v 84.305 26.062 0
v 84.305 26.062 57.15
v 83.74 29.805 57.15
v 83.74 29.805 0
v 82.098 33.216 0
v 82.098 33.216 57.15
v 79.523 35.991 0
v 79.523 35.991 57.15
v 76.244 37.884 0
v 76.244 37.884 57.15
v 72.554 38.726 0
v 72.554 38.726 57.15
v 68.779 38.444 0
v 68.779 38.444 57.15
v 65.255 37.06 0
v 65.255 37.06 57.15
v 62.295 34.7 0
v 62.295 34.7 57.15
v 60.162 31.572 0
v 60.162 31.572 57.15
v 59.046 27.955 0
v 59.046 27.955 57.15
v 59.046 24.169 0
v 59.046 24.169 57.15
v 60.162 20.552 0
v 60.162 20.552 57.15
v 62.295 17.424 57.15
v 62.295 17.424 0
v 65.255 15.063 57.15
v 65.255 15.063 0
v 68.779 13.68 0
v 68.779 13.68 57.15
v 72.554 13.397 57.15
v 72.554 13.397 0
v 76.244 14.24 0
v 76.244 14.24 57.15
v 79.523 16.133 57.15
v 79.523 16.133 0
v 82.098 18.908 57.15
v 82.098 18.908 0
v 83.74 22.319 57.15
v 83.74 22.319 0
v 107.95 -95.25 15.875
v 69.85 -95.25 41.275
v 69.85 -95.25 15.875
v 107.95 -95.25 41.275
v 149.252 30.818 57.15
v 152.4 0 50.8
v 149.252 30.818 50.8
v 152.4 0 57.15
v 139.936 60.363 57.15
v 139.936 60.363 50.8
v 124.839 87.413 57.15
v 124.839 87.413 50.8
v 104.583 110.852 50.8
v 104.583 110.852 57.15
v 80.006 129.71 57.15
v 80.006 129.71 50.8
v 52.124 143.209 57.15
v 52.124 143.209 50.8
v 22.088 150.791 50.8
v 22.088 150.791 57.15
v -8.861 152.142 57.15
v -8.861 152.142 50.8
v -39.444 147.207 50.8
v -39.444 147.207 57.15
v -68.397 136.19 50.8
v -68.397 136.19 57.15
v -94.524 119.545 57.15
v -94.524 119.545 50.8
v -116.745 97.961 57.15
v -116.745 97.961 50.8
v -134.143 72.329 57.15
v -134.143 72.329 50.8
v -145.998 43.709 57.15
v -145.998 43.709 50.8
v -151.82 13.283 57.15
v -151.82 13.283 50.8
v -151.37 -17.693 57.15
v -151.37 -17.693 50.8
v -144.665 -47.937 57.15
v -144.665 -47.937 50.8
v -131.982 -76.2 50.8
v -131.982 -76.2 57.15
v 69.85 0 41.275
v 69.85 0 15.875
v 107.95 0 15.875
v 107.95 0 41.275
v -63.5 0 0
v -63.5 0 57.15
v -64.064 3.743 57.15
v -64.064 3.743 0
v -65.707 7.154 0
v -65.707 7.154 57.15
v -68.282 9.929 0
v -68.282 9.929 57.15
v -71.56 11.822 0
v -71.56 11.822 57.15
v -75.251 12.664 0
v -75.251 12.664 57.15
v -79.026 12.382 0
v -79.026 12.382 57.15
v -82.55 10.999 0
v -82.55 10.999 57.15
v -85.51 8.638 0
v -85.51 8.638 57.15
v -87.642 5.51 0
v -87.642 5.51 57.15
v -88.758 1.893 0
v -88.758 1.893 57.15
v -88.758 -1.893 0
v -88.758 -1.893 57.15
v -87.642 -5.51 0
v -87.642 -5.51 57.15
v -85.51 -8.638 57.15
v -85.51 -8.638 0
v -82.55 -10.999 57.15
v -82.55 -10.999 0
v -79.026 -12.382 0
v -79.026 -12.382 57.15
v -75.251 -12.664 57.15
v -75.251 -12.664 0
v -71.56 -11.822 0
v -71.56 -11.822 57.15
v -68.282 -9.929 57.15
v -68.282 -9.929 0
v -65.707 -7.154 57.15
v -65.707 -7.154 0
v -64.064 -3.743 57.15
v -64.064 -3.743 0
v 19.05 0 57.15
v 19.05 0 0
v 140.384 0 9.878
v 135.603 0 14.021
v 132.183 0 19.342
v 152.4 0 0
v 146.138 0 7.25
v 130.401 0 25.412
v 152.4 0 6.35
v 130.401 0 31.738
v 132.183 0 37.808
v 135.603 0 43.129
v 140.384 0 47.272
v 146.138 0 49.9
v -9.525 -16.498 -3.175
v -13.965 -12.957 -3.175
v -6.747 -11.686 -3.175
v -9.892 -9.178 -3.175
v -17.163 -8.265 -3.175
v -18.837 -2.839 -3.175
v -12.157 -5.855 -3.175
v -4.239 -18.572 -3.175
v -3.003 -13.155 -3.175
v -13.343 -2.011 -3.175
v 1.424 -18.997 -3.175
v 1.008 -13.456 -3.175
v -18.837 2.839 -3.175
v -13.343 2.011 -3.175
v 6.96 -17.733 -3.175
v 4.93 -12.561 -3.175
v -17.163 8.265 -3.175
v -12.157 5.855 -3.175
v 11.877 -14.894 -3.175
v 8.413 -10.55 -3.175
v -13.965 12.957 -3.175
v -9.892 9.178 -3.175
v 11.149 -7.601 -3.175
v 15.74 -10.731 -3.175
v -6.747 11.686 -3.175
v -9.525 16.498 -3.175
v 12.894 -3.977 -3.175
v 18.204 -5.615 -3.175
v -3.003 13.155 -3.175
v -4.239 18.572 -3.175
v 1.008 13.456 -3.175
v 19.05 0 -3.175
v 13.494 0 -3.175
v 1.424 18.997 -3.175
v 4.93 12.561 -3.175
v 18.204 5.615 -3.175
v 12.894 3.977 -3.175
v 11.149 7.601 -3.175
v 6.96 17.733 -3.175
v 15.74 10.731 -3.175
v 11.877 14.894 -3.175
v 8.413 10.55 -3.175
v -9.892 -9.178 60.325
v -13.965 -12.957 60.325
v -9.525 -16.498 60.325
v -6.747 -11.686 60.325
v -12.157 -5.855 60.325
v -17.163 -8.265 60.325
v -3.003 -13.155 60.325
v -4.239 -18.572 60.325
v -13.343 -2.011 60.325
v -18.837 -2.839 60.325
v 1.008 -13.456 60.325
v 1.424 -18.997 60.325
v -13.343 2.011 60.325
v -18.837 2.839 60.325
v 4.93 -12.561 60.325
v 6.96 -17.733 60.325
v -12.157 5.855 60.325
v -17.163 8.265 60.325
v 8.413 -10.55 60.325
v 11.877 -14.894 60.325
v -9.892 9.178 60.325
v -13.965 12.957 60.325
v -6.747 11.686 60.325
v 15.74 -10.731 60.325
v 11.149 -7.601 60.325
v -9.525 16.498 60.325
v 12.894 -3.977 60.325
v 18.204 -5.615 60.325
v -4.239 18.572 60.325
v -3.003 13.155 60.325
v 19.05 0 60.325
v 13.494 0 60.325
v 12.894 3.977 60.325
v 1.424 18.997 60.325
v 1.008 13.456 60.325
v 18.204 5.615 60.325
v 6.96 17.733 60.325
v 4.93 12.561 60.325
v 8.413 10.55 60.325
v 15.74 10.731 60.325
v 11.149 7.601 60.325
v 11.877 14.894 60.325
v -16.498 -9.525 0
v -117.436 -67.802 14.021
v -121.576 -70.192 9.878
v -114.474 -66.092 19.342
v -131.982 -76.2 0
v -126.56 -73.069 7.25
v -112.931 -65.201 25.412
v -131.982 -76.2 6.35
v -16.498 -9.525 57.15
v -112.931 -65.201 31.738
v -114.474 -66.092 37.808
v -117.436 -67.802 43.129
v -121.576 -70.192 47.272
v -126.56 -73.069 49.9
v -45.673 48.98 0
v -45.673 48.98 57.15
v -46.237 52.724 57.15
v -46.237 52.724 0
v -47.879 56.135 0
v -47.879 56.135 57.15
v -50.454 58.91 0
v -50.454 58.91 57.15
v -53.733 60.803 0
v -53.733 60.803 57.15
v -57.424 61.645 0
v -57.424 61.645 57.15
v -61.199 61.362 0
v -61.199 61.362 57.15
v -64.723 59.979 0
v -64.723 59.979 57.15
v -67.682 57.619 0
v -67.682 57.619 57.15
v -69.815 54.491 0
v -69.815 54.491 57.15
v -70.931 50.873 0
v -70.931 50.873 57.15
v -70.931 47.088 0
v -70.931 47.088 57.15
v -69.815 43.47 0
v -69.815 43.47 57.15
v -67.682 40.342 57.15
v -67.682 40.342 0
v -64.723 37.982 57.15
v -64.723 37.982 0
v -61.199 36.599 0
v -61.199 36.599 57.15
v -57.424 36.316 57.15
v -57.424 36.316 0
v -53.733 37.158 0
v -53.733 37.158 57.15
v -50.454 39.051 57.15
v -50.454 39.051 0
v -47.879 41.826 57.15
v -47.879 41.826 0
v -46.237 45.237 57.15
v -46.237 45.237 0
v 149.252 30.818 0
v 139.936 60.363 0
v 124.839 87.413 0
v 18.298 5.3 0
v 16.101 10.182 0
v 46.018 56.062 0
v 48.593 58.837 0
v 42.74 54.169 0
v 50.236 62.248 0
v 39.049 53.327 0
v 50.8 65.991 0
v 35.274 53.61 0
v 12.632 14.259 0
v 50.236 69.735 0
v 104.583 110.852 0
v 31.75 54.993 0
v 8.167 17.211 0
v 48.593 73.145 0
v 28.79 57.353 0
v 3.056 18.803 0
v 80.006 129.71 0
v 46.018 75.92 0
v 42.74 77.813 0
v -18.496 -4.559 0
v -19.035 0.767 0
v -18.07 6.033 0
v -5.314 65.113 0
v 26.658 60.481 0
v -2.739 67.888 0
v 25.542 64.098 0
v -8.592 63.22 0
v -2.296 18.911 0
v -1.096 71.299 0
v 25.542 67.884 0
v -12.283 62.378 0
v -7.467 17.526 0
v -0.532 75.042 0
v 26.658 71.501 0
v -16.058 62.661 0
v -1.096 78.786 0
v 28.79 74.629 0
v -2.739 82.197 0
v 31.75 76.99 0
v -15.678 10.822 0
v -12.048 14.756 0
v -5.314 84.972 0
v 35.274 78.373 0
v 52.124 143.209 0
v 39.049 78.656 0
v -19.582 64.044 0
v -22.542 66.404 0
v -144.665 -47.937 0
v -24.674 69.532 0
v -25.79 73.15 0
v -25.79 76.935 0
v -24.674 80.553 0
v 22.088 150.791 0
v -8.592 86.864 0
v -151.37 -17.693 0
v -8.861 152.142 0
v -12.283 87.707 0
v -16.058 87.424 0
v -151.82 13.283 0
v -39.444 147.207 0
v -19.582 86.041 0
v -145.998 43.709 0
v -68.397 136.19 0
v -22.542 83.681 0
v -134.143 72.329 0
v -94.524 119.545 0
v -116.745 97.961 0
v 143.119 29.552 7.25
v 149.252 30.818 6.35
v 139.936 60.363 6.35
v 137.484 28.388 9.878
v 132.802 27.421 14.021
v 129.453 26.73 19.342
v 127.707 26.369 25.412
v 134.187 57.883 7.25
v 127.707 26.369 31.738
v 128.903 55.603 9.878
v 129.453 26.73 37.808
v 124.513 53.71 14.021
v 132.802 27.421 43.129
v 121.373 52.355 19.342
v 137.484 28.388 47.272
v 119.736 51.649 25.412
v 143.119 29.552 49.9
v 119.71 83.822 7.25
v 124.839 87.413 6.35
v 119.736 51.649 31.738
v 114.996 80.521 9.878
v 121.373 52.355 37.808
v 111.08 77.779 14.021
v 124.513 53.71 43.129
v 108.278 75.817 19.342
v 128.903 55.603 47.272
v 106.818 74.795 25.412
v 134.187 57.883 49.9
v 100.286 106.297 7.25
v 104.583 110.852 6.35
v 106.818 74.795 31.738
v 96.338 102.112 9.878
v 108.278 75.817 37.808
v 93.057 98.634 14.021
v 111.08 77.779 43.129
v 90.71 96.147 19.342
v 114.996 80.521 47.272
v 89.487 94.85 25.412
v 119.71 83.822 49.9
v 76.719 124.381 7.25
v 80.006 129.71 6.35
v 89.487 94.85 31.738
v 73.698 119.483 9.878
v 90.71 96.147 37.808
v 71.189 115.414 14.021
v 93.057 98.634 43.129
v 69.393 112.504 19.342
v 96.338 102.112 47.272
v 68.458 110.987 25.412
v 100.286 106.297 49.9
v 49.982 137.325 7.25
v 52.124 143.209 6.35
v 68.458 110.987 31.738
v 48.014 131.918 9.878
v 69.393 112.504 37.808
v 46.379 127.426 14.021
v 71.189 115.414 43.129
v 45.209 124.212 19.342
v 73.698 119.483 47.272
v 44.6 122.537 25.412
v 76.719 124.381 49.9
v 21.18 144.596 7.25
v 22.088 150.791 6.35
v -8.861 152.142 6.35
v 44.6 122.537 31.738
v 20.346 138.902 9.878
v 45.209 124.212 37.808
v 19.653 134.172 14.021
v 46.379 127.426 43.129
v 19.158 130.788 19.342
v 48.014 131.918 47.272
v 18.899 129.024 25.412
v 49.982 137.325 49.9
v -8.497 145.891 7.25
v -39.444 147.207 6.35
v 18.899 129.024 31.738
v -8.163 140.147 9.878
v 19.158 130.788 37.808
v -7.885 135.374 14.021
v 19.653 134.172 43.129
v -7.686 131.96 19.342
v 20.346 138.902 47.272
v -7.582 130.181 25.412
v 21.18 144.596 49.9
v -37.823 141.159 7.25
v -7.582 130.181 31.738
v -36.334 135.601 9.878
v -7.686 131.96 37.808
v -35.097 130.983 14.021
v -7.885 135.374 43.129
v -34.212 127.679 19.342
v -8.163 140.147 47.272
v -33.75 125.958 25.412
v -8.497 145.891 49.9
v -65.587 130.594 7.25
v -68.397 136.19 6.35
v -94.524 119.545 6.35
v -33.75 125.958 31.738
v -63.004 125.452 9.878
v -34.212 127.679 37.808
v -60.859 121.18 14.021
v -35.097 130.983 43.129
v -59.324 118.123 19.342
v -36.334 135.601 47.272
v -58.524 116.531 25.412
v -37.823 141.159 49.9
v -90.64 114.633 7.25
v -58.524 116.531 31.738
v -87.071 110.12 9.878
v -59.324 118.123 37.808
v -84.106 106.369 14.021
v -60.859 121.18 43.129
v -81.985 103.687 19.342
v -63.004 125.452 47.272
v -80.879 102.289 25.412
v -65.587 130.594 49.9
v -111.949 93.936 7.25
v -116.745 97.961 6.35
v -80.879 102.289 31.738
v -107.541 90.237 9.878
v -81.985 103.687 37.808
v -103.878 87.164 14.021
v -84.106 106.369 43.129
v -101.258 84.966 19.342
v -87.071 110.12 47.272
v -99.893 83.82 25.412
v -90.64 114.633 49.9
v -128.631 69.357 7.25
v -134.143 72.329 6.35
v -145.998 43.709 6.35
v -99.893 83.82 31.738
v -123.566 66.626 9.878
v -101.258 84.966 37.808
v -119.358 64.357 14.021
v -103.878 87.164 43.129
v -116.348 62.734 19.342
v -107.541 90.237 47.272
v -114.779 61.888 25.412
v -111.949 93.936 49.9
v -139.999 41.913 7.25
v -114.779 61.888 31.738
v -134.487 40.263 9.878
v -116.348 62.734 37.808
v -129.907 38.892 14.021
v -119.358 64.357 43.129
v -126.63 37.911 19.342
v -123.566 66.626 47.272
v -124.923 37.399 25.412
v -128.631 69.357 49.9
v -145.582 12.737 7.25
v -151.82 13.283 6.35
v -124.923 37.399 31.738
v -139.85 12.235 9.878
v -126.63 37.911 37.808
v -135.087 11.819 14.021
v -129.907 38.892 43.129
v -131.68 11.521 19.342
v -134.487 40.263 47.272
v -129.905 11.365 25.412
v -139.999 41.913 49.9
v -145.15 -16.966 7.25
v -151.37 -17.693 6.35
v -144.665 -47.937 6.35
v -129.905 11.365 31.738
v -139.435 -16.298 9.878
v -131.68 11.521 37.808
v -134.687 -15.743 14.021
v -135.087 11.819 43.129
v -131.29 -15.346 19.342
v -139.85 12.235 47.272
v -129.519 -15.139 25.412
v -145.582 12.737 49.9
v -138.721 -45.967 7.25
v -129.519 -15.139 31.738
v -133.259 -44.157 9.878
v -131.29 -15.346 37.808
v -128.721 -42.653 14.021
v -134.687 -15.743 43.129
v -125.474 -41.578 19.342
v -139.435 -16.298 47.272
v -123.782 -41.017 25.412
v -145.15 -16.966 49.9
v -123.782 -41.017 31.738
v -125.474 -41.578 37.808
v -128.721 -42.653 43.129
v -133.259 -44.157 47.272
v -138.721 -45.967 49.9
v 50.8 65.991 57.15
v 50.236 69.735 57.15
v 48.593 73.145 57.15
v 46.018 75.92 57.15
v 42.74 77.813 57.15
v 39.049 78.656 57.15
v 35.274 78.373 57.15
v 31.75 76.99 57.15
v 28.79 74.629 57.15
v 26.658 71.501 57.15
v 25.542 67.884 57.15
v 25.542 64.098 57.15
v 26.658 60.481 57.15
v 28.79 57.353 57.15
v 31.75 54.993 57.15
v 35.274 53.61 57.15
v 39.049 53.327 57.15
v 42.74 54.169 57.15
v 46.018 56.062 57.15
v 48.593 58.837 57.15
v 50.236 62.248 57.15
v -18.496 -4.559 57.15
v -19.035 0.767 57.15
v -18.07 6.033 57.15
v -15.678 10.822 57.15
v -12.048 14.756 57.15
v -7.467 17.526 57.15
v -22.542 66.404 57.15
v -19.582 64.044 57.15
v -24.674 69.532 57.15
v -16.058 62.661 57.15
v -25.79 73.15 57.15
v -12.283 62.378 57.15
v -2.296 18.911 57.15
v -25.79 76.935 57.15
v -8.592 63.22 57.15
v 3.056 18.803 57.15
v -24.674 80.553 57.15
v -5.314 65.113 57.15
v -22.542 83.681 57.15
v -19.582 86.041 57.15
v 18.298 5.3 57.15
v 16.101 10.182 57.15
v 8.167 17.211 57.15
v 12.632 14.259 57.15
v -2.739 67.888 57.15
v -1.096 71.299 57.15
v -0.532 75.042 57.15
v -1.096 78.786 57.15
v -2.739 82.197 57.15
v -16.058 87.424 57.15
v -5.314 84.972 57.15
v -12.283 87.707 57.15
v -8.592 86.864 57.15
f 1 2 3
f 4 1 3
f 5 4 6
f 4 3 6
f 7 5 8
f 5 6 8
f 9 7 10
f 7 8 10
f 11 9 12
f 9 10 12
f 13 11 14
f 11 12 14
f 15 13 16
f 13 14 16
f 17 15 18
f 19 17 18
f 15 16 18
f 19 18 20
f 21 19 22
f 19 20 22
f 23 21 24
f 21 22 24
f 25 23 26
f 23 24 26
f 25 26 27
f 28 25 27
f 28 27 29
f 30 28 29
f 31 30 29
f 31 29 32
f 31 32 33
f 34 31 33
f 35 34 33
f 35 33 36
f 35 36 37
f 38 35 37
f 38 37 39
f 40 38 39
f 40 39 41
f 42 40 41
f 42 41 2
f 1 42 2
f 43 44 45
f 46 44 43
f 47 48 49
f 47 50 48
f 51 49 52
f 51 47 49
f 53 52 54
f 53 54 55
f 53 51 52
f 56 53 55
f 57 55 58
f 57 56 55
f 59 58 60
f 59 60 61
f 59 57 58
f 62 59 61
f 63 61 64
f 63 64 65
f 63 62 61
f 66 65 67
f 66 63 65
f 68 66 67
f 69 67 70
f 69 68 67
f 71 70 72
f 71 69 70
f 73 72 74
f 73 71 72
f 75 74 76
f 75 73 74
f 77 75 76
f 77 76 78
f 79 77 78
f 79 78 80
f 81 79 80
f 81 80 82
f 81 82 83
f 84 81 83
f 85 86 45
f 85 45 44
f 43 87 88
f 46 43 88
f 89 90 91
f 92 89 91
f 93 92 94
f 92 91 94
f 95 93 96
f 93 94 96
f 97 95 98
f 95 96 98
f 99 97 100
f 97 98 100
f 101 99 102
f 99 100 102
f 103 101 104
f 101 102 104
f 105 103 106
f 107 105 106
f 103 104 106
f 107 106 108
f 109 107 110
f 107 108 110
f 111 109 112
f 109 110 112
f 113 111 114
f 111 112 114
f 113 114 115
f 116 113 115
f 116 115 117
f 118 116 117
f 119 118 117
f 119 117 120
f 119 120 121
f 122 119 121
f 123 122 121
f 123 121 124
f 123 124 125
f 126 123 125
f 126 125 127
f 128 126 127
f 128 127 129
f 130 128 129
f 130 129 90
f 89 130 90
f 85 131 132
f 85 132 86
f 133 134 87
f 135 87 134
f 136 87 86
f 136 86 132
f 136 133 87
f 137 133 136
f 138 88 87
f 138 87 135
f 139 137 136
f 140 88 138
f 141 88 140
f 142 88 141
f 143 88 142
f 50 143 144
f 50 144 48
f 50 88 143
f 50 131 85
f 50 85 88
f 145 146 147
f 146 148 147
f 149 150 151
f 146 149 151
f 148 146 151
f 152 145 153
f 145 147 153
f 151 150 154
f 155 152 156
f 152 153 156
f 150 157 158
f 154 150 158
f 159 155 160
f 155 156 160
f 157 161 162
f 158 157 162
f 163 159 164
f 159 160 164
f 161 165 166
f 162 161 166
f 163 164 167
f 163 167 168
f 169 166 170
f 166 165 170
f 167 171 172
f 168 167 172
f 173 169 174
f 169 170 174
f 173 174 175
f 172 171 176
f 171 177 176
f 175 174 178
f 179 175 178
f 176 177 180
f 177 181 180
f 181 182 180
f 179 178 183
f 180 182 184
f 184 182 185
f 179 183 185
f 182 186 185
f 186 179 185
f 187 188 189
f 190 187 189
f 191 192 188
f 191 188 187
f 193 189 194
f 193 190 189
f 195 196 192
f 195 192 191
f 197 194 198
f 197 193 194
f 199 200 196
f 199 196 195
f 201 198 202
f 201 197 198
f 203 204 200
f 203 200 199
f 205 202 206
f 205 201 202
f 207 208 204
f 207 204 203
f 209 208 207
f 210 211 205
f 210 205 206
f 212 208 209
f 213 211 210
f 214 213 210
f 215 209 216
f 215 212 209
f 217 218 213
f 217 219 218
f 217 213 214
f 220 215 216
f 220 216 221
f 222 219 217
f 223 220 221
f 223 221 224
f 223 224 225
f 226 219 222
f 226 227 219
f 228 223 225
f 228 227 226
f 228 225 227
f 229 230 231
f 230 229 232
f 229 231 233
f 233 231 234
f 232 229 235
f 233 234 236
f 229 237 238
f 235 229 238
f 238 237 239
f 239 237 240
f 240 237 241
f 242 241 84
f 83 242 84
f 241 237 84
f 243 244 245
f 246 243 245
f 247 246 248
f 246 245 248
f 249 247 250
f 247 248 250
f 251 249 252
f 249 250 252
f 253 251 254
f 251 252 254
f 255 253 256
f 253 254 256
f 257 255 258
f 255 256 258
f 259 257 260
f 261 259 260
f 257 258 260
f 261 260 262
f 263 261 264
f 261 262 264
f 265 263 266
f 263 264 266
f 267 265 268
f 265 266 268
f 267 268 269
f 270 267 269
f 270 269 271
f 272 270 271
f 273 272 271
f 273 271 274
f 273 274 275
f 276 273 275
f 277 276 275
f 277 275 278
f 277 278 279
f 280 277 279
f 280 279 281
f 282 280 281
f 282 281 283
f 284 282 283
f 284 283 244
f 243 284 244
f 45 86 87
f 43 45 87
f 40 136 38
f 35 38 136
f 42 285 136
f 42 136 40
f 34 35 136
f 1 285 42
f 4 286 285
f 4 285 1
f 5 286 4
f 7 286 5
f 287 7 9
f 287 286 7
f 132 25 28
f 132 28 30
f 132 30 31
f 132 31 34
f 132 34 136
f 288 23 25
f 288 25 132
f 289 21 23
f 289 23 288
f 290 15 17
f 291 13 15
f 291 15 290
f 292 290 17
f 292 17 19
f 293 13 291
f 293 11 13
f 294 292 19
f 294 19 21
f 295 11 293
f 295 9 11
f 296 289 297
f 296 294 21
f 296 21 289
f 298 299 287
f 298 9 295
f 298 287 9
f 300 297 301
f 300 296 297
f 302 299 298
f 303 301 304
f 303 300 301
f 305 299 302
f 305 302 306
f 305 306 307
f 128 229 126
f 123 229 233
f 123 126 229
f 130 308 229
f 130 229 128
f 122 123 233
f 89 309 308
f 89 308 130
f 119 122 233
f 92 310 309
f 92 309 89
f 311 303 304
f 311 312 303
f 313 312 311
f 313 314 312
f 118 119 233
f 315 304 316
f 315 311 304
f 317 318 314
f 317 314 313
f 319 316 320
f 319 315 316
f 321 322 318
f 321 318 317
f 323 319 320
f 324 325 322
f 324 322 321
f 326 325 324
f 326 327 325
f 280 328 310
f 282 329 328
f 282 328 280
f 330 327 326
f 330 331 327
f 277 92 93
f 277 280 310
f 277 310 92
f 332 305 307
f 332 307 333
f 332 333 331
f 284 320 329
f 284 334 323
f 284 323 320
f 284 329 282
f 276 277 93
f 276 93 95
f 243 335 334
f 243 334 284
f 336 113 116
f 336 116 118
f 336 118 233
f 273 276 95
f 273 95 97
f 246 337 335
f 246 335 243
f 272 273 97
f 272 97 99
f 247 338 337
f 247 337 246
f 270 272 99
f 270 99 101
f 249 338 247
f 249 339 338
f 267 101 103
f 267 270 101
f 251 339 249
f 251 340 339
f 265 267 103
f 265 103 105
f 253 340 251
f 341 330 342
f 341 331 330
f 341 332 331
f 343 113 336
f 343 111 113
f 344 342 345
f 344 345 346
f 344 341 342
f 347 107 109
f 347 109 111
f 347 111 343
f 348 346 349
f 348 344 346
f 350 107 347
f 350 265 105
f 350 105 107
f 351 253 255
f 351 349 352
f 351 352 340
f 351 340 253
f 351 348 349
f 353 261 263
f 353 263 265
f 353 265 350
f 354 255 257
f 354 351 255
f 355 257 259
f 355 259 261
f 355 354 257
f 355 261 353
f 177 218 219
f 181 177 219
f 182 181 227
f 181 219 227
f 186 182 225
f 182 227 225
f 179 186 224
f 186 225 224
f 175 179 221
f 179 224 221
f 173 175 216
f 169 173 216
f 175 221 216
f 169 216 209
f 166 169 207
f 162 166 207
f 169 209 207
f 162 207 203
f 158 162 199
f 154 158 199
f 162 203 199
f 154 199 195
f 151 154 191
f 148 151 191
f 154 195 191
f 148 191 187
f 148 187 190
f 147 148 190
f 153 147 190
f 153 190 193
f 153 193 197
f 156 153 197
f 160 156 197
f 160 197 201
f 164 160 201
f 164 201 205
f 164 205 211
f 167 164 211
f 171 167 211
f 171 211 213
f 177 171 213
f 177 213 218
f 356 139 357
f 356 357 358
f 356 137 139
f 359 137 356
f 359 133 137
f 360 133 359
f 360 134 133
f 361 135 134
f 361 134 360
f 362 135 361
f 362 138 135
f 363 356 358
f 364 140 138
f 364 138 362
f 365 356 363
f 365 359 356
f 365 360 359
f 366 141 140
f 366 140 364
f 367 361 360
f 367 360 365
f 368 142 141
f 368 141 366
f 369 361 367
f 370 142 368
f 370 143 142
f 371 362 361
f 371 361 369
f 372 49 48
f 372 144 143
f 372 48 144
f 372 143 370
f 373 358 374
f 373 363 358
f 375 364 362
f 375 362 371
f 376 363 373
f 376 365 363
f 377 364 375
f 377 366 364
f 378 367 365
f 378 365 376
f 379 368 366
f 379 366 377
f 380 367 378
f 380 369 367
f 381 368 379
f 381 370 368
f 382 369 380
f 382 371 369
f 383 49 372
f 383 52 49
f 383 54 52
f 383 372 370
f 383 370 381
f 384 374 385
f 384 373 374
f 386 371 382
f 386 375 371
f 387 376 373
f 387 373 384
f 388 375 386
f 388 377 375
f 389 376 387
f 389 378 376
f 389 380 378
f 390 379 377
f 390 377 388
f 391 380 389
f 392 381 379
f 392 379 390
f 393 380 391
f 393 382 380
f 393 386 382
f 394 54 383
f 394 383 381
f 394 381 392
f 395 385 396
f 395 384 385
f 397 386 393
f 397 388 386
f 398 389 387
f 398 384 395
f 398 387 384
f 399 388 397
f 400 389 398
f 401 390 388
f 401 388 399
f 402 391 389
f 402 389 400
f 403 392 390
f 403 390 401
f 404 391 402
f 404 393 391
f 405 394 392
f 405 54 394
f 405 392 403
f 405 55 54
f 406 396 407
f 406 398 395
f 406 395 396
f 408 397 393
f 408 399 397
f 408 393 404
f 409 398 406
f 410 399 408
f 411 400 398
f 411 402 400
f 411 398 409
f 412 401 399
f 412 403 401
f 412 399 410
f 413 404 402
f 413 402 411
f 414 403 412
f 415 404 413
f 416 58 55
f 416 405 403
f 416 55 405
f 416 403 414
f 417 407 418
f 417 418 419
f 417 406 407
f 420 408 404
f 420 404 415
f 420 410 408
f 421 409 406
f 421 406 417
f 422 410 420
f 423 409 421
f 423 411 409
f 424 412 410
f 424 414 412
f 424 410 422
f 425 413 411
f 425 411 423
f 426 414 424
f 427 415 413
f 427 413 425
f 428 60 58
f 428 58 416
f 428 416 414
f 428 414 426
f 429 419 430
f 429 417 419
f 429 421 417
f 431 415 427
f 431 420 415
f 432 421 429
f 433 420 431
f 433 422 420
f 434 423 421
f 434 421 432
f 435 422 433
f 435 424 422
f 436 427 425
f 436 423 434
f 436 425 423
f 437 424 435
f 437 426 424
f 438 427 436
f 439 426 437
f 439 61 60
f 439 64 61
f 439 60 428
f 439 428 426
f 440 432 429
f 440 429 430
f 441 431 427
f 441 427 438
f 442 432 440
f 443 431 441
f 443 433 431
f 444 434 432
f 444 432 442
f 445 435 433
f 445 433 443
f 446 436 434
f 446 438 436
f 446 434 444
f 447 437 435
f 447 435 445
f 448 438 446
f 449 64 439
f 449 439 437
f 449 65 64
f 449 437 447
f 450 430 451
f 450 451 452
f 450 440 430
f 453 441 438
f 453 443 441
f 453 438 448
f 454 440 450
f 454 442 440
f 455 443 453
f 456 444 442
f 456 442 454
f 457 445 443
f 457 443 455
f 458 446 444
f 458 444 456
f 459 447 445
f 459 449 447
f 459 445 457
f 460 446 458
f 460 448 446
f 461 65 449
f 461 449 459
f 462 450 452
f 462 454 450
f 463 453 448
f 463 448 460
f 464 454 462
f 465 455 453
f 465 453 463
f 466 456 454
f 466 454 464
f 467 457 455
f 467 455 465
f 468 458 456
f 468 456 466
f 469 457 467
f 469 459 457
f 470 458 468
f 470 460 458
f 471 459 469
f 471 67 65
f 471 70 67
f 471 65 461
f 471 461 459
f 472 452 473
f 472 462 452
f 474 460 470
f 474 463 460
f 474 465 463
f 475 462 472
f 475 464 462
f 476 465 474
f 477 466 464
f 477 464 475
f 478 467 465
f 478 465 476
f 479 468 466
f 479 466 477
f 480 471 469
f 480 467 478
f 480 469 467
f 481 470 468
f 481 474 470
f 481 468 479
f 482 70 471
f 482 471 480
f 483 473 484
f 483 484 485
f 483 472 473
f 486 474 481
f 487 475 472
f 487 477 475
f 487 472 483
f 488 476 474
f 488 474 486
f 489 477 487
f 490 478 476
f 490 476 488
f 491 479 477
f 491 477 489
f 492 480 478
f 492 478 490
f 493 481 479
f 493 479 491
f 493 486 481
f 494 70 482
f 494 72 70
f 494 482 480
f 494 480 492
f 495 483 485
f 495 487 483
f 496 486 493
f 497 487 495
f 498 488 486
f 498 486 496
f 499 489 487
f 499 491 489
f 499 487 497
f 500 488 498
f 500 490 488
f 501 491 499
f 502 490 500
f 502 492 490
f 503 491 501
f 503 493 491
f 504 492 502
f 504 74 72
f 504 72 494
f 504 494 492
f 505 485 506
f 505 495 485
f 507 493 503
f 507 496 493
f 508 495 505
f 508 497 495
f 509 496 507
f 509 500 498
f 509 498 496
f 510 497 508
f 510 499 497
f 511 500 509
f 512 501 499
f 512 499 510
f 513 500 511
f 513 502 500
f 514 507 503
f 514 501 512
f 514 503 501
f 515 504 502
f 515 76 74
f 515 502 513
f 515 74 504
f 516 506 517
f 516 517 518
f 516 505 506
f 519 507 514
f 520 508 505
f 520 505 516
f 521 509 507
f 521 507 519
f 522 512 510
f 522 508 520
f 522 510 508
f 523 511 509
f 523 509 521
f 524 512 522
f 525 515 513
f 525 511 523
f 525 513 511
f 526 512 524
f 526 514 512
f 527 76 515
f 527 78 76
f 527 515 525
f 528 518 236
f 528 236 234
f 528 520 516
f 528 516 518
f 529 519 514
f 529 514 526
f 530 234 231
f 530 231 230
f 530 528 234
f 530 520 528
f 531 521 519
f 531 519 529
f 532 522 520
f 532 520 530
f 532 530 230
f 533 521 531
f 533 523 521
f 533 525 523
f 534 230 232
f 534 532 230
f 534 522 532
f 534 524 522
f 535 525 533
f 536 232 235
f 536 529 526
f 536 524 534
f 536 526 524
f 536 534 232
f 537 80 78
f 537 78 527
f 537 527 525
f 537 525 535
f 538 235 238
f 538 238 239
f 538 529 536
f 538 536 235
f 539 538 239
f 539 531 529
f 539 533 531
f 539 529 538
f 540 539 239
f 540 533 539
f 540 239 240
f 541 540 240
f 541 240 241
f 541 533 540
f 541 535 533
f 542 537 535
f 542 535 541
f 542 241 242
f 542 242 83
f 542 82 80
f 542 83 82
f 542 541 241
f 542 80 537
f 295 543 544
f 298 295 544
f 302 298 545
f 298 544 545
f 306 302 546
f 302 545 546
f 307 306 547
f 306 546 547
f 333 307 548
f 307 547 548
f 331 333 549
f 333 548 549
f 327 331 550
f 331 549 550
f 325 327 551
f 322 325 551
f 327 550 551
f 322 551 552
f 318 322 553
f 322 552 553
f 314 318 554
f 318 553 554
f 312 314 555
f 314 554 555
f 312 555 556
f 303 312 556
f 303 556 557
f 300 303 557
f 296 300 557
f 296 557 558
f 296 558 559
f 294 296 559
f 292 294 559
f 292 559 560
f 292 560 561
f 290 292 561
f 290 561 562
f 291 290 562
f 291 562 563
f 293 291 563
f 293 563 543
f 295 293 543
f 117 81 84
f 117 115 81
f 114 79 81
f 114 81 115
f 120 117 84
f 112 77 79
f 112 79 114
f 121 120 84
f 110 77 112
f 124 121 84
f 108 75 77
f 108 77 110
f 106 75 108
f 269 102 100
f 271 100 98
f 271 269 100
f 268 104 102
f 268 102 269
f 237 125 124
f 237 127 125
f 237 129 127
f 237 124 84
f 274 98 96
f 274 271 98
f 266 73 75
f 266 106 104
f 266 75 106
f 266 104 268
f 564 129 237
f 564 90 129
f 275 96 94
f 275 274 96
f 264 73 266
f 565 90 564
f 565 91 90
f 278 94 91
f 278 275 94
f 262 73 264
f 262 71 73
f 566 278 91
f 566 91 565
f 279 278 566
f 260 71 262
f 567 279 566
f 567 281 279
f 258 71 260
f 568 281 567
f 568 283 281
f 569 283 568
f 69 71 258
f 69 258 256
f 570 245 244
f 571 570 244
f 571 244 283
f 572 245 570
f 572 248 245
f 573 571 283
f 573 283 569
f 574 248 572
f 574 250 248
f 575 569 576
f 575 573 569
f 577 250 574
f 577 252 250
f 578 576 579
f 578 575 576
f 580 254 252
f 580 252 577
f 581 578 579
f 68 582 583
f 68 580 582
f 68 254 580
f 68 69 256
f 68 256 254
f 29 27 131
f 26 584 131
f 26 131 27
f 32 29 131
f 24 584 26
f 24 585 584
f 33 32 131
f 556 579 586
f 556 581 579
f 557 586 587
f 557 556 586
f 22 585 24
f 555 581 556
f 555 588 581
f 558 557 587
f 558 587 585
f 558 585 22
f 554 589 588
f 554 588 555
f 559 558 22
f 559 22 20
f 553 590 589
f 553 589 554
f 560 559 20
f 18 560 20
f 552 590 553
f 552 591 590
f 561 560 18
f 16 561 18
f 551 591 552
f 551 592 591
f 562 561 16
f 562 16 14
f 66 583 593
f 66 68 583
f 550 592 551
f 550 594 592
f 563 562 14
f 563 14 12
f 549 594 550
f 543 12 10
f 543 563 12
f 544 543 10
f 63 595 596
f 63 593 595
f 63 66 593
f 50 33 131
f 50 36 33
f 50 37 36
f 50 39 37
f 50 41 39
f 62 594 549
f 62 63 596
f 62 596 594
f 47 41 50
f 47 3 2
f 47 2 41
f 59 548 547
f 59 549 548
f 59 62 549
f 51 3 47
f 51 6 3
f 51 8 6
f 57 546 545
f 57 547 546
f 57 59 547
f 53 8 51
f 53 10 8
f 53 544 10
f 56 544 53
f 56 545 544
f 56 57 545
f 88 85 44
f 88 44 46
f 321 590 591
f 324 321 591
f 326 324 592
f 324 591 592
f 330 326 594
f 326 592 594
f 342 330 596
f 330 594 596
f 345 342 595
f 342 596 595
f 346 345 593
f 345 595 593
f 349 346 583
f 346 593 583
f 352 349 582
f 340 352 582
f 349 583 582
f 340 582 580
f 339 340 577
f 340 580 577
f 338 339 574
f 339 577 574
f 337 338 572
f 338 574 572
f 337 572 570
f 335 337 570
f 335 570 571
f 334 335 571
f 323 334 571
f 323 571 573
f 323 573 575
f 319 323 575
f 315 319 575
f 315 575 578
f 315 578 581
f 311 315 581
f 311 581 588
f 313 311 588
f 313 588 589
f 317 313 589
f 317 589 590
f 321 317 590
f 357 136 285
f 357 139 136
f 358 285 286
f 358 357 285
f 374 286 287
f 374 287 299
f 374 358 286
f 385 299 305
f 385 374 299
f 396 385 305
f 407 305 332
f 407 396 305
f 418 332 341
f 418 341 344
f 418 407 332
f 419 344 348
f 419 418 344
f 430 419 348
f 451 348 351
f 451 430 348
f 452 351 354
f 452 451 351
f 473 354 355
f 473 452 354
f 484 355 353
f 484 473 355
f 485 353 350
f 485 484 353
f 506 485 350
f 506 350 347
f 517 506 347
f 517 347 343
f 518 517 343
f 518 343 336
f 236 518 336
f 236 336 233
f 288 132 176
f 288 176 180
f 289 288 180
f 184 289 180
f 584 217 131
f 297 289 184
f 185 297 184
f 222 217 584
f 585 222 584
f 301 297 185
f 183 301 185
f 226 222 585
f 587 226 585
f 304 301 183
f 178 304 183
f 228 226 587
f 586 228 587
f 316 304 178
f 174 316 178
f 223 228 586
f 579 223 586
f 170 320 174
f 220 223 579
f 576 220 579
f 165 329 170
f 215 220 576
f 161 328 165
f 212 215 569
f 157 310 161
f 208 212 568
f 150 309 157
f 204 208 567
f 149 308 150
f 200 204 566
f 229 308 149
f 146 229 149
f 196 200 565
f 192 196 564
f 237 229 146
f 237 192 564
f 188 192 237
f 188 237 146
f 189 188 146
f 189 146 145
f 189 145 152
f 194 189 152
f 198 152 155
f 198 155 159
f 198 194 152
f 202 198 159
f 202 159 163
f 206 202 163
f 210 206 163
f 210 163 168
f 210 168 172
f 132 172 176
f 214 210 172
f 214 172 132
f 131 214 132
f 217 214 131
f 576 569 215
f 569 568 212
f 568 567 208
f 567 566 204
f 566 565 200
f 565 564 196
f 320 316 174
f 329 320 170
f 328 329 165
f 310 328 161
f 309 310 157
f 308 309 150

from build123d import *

# Parameters (mm, degrees)
F1_ANGLE = 210
F2_R     = 13.49375
F3_DEPTH = 69.85
F4_R     = 12.7
F5_DEPTH = 63.5
F6_W     = 38.1
F6_H     = 25.4
F7_DEPTH = 95.25
F8_R     = 19.05
F8_R_2   = 13.49375
F9_DEPTH = 63.5


with BuildPart() as f1:
    # F0 (on Front) → F1 (revolve)
    with BuildSketch(Plane.XZ):
        with BuildLine():
            Line((19.05, 57.15), (19.05, 0))
            Line((19.05, 0), (152.4, 0))
            Line((152.4, 0), (152.4, 6.35))
            ThreePointArc((152.4, 6.35), (130.175, 28.575), (152.4, 50.8))
            Line((152.4, 50.8), (152.4, 57.15))
            Line((152.4, 57.15), (19.05, 57.15))
        make_face()
        Polygon((19.05, -3.175), (19.05, 0), (19.05, 57.15), (19.05, 60.325), (0, 60.325), (0, 57.15), (0, 0), (0, -3.175), align=None)
    revolve(axis=Axis((0, 0, 28.575), (0, 0, 1)), revolution_arc=F1_ANGLE)

    # F2 (on face) → F3 (cut)
    with BuildSketch(Plane.XY.offset(60.325)):
        Circle(F2_R)
    extrude(amount=-F3_DEPTH, mode=Mode.SUBTRACT)

    # F4 (on face) → F5 (cut)
    with BuildSketch(Plane.XY.offset(57.15)):
        with Locations((-76.2, 0)):
            Circle(F4_R)
        with Locations((-58.372587, 48.980416)):
            Circle(F4_R)
        with Locations((-13.231991, 75.042351)):
            Circle(F4_R)
        with Locations((38.1, 65.991136)):
            Circle(F4_R)
        with Locations((71.604578, 26.061935)):
            Circle(F4_R)
    extrude(amount=-F5_DEPTH, mode=Mode.SUBTRACT)

    # F6 (on face) → F7 (join)
    with BuildSketch(Plane.XZ):
        with Locations((88.9, 28.575)):
            Rectangle(F6_W, F6_H)
    extrude(amount=F7_DEPTH)

    # F8 (on face) → F9 (join)
    with BuildSketch(Plane.XY.offset(60.325)):
        Circle(F8_R)
        Circle(F8_R_2, mode=Mode.SUBTRACT)
    extrude(amount=-F9_DEPTH)


solid = f1.part
